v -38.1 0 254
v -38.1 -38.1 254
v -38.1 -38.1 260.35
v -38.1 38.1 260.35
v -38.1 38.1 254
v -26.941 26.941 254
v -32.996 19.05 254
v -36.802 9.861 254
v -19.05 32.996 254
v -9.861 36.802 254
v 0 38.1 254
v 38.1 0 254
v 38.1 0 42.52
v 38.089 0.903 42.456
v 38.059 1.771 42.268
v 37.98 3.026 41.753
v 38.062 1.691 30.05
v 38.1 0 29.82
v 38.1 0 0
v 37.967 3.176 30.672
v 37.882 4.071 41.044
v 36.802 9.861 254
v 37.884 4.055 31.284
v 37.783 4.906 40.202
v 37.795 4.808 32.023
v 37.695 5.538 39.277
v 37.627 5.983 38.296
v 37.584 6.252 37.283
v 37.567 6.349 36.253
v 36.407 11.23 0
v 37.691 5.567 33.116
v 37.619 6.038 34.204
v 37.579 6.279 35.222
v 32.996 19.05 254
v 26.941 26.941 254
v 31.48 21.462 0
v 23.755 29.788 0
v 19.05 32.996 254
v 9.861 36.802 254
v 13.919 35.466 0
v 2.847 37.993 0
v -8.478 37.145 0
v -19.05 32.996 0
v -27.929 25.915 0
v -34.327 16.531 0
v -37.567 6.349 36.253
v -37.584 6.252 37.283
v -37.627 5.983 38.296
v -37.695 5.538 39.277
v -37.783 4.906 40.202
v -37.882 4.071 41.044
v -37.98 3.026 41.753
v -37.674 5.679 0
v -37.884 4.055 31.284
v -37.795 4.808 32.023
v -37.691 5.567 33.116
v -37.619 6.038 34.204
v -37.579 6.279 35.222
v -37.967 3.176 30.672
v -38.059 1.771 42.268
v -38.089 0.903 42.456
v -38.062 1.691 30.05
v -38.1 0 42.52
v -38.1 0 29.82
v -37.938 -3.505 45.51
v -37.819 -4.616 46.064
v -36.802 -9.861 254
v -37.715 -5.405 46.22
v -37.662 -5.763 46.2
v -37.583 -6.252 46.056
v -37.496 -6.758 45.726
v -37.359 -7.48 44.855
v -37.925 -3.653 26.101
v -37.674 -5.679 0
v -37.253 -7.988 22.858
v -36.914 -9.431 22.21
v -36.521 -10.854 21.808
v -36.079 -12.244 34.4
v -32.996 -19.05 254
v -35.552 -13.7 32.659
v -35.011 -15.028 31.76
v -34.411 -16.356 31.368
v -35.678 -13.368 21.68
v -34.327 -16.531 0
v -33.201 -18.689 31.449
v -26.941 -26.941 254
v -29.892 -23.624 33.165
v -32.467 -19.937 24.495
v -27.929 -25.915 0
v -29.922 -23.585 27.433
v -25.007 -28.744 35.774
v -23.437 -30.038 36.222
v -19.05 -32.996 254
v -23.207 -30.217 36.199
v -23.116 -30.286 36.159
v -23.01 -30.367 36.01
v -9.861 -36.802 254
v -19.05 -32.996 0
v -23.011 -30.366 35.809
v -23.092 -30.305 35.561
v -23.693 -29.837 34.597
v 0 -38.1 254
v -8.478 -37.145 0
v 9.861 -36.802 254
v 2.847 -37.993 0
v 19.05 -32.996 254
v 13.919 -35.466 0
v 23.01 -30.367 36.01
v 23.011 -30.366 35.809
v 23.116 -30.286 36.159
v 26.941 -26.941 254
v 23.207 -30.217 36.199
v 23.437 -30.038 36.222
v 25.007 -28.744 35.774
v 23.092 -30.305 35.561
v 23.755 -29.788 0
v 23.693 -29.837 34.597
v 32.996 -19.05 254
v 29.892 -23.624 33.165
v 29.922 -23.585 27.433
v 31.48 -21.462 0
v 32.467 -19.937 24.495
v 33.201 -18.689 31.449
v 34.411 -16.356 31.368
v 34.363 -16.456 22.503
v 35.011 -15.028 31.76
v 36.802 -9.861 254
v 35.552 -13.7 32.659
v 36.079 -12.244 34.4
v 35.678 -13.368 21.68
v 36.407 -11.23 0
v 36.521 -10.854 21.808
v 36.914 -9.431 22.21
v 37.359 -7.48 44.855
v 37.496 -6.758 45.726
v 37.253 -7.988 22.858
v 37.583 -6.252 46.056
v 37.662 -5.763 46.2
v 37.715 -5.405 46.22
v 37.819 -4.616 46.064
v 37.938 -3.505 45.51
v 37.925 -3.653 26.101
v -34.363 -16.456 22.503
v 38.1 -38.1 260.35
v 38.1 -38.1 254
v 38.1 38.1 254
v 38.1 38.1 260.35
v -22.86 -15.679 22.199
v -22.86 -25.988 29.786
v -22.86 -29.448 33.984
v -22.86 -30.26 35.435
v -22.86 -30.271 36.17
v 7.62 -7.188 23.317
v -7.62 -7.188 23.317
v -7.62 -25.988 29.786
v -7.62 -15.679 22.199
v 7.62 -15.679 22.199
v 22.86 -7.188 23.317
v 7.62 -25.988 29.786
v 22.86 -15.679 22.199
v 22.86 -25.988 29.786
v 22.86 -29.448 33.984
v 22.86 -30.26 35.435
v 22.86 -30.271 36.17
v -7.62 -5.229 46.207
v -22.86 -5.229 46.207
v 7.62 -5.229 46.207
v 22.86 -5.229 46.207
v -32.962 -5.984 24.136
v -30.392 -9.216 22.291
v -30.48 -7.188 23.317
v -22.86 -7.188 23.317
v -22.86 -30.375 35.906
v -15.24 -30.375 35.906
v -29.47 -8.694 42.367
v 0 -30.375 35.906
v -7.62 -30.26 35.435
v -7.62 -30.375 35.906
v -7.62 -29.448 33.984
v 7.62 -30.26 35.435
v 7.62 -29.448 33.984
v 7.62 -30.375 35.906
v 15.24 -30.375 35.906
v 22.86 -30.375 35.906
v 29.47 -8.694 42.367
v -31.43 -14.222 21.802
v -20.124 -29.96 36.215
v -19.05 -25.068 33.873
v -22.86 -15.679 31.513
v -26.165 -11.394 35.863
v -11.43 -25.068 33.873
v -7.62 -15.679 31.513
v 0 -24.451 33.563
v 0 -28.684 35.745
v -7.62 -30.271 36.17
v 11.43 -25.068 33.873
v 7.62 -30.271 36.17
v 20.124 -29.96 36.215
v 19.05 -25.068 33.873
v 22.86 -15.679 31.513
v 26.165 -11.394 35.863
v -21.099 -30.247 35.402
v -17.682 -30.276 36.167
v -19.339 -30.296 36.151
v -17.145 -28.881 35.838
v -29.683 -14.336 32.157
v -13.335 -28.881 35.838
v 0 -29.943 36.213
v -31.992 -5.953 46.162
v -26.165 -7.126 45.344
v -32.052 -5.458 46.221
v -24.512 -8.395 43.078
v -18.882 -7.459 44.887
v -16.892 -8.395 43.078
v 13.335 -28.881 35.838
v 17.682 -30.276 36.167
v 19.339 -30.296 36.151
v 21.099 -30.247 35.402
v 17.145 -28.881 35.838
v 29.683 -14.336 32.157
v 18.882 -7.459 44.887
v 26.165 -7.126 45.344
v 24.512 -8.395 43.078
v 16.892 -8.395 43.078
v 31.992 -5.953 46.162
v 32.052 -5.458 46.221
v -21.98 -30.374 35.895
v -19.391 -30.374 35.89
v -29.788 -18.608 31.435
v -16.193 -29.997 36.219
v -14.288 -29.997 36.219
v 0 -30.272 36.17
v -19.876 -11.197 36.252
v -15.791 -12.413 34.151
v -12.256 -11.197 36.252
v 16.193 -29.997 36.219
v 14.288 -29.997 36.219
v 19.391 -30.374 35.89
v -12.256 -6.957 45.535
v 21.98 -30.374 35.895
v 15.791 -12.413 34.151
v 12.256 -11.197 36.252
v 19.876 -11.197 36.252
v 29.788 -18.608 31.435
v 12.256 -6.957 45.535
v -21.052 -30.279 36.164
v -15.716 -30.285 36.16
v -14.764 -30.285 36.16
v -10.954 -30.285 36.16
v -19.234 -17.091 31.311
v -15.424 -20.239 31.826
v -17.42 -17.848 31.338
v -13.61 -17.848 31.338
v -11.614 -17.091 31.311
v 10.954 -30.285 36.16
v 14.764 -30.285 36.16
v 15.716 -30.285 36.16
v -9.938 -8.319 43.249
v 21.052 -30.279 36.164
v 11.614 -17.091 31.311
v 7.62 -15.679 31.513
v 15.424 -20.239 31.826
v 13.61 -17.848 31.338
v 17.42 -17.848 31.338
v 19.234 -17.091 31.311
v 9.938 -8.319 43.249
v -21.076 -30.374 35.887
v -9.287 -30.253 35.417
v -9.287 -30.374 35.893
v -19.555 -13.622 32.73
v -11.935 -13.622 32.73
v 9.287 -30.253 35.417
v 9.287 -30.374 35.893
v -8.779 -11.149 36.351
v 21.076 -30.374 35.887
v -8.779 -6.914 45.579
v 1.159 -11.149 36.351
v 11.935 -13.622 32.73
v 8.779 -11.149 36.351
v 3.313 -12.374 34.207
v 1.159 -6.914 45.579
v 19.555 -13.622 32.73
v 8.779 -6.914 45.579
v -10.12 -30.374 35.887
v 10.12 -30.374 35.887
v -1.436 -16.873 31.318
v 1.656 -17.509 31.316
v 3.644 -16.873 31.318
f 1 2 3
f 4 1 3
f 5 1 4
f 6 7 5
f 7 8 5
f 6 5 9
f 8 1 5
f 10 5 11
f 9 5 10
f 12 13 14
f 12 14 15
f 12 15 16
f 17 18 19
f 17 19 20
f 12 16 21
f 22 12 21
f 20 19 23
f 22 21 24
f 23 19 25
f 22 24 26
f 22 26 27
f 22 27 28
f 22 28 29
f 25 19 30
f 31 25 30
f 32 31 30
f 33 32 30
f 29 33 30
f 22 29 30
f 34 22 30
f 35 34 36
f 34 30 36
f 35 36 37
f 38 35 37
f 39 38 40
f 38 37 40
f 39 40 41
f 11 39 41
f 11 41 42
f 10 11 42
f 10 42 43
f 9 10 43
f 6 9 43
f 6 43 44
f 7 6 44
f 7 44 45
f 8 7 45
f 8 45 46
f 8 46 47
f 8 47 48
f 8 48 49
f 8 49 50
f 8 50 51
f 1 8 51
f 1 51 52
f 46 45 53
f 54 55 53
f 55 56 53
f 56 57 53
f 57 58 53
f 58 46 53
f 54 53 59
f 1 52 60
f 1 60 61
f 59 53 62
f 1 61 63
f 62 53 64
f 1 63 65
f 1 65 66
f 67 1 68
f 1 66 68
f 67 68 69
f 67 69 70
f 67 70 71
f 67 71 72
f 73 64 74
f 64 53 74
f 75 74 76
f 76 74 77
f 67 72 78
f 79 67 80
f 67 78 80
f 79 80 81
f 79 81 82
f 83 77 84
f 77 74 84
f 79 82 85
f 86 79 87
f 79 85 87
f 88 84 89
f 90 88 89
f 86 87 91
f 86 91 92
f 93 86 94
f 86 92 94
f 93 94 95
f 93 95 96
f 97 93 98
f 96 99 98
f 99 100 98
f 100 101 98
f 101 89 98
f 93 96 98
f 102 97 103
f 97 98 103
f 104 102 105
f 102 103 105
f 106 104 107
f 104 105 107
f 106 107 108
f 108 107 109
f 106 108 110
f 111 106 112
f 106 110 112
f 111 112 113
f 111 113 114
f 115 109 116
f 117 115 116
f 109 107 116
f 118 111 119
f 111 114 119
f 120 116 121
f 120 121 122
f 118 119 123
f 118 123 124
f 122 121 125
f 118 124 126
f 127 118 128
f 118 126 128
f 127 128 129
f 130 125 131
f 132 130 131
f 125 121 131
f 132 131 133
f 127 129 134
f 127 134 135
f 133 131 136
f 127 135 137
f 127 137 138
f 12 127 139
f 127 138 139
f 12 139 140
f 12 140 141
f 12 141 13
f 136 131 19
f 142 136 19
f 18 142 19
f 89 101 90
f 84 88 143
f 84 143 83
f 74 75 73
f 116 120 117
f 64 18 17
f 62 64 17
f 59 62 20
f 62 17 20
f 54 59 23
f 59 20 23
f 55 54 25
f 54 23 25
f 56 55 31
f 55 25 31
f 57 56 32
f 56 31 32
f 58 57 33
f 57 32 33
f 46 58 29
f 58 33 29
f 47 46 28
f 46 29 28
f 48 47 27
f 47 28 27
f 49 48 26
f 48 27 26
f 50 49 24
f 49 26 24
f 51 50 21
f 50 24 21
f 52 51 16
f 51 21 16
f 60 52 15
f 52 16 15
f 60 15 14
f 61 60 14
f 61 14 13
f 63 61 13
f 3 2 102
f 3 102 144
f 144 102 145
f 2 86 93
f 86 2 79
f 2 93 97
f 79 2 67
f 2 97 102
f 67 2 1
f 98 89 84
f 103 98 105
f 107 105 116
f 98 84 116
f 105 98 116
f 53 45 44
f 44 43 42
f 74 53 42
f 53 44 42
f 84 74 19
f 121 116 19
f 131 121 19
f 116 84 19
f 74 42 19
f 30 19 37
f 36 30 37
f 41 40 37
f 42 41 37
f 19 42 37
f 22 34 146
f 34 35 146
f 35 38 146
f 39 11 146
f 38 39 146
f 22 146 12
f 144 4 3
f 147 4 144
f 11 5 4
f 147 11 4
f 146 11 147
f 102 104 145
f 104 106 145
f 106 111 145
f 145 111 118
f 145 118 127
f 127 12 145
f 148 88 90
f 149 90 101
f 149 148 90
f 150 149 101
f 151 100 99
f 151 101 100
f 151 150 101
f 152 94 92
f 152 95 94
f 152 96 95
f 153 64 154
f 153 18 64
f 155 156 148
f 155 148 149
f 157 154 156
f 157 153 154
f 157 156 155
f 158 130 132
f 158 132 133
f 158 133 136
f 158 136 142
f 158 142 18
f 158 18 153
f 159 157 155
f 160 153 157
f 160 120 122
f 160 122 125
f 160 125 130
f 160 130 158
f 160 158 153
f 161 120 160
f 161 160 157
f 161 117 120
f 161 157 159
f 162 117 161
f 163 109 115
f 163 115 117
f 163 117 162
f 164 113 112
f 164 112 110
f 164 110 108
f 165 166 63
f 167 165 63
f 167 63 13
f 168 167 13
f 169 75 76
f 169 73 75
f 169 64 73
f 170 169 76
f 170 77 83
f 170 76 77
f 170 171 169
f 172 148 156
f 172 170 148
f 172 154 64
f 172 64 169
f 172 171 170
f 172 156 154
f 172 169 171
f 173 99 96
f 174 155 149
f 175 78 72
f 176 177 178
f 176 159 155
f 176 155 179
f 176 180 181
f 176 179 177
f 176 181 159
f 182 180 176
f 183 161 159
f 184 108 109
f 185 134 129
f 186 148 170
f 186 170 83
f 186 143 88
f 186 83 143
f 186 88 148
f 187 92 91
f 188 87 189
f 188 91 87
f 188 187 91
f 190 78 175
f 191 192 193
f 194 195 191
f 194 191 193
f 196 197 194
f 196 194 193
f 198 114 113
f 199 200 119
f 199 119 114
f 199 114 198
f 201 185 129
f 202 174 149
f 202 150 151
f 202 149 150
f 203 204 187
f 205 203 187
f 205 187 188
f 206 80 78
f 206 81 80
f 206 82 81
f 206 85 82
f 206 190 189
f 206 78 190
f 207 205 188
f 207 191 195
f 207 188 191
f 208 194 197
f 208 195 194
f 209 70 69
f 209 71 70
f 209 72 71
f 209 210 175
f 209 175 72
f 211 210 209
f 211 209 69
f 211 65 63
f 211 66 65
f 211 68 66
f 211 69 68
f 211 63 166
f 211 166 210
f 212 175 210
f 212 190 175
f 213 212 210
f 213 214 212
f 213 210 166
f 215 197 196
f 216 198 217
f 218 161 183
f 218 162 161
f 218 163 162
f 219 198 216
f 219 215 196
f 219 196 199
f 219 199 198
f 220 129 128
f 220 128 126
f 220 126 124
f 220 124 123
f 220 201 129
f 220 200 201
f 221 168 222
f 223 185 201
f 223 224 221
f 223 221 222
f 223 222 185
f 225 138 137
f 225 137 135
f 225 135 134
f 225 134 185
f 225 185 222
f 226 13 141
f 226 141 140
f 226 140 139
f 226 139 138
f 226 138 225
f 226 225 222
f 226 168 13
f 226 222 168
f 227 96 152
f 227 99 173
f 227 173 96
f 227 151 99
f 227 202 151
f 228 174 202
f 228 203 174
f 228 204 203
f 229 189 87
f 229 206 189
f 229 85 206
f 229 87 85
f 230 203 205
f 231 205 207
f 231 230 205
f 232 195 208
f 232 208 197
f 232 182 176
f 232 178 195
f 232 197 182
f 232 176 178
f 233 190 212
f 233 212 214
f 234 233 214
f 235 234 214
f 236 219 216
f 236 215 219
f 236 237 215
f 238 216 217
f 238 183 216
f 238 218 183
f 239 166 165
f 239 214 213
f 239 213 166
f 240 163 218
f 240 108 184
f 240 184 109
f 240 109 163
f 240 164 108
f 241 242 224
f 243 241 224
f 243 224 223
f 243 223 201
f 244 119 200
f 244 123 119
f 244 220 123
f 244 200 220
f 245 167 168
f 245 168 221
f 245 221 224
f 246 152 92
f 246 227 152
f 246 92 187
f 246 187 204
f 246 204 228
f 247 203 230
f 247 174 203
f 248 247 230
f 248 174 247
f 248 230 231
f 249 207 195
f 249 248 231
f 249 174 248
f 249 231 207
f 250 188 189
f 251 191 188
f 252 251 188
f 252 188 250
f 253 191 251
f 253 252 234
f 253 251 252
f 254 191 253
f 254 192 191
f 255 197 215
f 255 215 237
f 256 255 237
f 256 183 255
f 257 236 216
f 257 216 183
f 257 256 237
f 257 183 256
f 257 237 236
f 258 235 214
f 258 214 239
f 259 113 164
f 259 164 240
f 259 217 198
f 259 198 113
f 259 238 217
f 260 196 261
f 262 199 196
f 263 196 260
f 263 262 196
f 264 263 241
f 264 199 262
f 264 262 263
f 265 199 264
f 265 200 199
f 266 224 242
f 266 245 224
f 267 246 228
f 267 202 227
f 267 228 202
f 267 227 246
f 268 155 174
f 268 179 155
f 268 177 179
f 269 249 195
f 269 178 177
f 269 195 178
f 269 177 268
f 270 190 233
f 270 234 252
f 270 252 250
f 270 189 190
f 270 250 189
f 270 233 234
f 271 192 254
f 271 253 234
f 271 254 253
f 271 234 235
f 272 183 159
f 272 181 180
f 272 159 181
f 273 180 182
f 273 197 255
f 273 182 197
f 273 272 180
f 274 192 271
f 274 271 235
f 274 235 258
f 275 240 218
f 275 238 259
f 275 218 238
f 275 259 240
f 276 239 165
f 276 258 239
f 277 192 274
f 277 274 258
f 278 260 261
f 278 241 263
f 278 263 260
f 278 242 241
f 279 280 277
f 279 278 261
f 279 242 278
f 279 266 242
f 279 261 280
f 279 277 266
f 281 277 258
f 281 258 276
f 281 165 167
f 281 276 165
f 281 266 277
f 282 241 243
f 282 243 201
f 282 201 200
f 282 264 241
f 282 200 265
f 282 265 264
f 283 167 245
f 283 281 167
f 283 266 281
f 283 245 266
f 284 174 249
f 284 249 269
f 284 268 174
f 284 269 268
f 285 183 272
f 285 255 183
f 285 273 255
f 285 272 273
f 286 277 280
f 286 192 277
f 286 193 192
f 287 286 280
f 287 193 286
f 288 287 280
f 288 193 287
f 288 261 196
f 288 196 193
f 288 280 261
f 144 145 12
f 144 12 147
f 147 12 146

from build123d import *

# Parameters (mm, degrees)
F0_R     = 38.1
F1_DEPTH = 254
F2_W     = 76.2
F2_H     = 76.2
F3_DEPTH = 6.35
F6_DEPTH = 76.201


with BuildPart() as f1:
    # F0 (on Top) → F1 (new body)
    with BuildSketch(Plane.XY):
        Circle(F0_R)
    extrude(amount=F1_DEPTH)

    # F2 (on face) → F3 (join)
    with BuildSketch(Plane.XY.offset(254)):
        Rectangle(F2_W, F2_H)
    extrude(amount=F3_DEPTH)

    # F5 (on offset) → F6 (cut, through all)
    with BuildSketch(Plane.YZ.offset(38.1)):
        with BuildLine():
            add(Edge.make_bspline(
                [(0, 29.820270294), (-4.6476458963, 24.8863690504), (-14.2984668544, 14.6411398336), (-39.1702712633, 44.7075995996), (-11.5658950542, 22.9053639125), (-8.594327492, 50.7314877801), (-2.4507022089, 44.8617273597), (0, 42.520270294)],
                knots=[0, 0, 0, 0, 0.2150067042, 0.4464606928, 0.6479987681, 0.8595861308, 1, 1, 1, 1], degree=3))
            ThreePointArc((0, 29.820270294), (6.35, 36.170270294), (0, 42.520270294))
        make_face()
    extrude(amount=-F6_DEPTH, mode=Mode.SUBTRACT)


solid = f1.part
